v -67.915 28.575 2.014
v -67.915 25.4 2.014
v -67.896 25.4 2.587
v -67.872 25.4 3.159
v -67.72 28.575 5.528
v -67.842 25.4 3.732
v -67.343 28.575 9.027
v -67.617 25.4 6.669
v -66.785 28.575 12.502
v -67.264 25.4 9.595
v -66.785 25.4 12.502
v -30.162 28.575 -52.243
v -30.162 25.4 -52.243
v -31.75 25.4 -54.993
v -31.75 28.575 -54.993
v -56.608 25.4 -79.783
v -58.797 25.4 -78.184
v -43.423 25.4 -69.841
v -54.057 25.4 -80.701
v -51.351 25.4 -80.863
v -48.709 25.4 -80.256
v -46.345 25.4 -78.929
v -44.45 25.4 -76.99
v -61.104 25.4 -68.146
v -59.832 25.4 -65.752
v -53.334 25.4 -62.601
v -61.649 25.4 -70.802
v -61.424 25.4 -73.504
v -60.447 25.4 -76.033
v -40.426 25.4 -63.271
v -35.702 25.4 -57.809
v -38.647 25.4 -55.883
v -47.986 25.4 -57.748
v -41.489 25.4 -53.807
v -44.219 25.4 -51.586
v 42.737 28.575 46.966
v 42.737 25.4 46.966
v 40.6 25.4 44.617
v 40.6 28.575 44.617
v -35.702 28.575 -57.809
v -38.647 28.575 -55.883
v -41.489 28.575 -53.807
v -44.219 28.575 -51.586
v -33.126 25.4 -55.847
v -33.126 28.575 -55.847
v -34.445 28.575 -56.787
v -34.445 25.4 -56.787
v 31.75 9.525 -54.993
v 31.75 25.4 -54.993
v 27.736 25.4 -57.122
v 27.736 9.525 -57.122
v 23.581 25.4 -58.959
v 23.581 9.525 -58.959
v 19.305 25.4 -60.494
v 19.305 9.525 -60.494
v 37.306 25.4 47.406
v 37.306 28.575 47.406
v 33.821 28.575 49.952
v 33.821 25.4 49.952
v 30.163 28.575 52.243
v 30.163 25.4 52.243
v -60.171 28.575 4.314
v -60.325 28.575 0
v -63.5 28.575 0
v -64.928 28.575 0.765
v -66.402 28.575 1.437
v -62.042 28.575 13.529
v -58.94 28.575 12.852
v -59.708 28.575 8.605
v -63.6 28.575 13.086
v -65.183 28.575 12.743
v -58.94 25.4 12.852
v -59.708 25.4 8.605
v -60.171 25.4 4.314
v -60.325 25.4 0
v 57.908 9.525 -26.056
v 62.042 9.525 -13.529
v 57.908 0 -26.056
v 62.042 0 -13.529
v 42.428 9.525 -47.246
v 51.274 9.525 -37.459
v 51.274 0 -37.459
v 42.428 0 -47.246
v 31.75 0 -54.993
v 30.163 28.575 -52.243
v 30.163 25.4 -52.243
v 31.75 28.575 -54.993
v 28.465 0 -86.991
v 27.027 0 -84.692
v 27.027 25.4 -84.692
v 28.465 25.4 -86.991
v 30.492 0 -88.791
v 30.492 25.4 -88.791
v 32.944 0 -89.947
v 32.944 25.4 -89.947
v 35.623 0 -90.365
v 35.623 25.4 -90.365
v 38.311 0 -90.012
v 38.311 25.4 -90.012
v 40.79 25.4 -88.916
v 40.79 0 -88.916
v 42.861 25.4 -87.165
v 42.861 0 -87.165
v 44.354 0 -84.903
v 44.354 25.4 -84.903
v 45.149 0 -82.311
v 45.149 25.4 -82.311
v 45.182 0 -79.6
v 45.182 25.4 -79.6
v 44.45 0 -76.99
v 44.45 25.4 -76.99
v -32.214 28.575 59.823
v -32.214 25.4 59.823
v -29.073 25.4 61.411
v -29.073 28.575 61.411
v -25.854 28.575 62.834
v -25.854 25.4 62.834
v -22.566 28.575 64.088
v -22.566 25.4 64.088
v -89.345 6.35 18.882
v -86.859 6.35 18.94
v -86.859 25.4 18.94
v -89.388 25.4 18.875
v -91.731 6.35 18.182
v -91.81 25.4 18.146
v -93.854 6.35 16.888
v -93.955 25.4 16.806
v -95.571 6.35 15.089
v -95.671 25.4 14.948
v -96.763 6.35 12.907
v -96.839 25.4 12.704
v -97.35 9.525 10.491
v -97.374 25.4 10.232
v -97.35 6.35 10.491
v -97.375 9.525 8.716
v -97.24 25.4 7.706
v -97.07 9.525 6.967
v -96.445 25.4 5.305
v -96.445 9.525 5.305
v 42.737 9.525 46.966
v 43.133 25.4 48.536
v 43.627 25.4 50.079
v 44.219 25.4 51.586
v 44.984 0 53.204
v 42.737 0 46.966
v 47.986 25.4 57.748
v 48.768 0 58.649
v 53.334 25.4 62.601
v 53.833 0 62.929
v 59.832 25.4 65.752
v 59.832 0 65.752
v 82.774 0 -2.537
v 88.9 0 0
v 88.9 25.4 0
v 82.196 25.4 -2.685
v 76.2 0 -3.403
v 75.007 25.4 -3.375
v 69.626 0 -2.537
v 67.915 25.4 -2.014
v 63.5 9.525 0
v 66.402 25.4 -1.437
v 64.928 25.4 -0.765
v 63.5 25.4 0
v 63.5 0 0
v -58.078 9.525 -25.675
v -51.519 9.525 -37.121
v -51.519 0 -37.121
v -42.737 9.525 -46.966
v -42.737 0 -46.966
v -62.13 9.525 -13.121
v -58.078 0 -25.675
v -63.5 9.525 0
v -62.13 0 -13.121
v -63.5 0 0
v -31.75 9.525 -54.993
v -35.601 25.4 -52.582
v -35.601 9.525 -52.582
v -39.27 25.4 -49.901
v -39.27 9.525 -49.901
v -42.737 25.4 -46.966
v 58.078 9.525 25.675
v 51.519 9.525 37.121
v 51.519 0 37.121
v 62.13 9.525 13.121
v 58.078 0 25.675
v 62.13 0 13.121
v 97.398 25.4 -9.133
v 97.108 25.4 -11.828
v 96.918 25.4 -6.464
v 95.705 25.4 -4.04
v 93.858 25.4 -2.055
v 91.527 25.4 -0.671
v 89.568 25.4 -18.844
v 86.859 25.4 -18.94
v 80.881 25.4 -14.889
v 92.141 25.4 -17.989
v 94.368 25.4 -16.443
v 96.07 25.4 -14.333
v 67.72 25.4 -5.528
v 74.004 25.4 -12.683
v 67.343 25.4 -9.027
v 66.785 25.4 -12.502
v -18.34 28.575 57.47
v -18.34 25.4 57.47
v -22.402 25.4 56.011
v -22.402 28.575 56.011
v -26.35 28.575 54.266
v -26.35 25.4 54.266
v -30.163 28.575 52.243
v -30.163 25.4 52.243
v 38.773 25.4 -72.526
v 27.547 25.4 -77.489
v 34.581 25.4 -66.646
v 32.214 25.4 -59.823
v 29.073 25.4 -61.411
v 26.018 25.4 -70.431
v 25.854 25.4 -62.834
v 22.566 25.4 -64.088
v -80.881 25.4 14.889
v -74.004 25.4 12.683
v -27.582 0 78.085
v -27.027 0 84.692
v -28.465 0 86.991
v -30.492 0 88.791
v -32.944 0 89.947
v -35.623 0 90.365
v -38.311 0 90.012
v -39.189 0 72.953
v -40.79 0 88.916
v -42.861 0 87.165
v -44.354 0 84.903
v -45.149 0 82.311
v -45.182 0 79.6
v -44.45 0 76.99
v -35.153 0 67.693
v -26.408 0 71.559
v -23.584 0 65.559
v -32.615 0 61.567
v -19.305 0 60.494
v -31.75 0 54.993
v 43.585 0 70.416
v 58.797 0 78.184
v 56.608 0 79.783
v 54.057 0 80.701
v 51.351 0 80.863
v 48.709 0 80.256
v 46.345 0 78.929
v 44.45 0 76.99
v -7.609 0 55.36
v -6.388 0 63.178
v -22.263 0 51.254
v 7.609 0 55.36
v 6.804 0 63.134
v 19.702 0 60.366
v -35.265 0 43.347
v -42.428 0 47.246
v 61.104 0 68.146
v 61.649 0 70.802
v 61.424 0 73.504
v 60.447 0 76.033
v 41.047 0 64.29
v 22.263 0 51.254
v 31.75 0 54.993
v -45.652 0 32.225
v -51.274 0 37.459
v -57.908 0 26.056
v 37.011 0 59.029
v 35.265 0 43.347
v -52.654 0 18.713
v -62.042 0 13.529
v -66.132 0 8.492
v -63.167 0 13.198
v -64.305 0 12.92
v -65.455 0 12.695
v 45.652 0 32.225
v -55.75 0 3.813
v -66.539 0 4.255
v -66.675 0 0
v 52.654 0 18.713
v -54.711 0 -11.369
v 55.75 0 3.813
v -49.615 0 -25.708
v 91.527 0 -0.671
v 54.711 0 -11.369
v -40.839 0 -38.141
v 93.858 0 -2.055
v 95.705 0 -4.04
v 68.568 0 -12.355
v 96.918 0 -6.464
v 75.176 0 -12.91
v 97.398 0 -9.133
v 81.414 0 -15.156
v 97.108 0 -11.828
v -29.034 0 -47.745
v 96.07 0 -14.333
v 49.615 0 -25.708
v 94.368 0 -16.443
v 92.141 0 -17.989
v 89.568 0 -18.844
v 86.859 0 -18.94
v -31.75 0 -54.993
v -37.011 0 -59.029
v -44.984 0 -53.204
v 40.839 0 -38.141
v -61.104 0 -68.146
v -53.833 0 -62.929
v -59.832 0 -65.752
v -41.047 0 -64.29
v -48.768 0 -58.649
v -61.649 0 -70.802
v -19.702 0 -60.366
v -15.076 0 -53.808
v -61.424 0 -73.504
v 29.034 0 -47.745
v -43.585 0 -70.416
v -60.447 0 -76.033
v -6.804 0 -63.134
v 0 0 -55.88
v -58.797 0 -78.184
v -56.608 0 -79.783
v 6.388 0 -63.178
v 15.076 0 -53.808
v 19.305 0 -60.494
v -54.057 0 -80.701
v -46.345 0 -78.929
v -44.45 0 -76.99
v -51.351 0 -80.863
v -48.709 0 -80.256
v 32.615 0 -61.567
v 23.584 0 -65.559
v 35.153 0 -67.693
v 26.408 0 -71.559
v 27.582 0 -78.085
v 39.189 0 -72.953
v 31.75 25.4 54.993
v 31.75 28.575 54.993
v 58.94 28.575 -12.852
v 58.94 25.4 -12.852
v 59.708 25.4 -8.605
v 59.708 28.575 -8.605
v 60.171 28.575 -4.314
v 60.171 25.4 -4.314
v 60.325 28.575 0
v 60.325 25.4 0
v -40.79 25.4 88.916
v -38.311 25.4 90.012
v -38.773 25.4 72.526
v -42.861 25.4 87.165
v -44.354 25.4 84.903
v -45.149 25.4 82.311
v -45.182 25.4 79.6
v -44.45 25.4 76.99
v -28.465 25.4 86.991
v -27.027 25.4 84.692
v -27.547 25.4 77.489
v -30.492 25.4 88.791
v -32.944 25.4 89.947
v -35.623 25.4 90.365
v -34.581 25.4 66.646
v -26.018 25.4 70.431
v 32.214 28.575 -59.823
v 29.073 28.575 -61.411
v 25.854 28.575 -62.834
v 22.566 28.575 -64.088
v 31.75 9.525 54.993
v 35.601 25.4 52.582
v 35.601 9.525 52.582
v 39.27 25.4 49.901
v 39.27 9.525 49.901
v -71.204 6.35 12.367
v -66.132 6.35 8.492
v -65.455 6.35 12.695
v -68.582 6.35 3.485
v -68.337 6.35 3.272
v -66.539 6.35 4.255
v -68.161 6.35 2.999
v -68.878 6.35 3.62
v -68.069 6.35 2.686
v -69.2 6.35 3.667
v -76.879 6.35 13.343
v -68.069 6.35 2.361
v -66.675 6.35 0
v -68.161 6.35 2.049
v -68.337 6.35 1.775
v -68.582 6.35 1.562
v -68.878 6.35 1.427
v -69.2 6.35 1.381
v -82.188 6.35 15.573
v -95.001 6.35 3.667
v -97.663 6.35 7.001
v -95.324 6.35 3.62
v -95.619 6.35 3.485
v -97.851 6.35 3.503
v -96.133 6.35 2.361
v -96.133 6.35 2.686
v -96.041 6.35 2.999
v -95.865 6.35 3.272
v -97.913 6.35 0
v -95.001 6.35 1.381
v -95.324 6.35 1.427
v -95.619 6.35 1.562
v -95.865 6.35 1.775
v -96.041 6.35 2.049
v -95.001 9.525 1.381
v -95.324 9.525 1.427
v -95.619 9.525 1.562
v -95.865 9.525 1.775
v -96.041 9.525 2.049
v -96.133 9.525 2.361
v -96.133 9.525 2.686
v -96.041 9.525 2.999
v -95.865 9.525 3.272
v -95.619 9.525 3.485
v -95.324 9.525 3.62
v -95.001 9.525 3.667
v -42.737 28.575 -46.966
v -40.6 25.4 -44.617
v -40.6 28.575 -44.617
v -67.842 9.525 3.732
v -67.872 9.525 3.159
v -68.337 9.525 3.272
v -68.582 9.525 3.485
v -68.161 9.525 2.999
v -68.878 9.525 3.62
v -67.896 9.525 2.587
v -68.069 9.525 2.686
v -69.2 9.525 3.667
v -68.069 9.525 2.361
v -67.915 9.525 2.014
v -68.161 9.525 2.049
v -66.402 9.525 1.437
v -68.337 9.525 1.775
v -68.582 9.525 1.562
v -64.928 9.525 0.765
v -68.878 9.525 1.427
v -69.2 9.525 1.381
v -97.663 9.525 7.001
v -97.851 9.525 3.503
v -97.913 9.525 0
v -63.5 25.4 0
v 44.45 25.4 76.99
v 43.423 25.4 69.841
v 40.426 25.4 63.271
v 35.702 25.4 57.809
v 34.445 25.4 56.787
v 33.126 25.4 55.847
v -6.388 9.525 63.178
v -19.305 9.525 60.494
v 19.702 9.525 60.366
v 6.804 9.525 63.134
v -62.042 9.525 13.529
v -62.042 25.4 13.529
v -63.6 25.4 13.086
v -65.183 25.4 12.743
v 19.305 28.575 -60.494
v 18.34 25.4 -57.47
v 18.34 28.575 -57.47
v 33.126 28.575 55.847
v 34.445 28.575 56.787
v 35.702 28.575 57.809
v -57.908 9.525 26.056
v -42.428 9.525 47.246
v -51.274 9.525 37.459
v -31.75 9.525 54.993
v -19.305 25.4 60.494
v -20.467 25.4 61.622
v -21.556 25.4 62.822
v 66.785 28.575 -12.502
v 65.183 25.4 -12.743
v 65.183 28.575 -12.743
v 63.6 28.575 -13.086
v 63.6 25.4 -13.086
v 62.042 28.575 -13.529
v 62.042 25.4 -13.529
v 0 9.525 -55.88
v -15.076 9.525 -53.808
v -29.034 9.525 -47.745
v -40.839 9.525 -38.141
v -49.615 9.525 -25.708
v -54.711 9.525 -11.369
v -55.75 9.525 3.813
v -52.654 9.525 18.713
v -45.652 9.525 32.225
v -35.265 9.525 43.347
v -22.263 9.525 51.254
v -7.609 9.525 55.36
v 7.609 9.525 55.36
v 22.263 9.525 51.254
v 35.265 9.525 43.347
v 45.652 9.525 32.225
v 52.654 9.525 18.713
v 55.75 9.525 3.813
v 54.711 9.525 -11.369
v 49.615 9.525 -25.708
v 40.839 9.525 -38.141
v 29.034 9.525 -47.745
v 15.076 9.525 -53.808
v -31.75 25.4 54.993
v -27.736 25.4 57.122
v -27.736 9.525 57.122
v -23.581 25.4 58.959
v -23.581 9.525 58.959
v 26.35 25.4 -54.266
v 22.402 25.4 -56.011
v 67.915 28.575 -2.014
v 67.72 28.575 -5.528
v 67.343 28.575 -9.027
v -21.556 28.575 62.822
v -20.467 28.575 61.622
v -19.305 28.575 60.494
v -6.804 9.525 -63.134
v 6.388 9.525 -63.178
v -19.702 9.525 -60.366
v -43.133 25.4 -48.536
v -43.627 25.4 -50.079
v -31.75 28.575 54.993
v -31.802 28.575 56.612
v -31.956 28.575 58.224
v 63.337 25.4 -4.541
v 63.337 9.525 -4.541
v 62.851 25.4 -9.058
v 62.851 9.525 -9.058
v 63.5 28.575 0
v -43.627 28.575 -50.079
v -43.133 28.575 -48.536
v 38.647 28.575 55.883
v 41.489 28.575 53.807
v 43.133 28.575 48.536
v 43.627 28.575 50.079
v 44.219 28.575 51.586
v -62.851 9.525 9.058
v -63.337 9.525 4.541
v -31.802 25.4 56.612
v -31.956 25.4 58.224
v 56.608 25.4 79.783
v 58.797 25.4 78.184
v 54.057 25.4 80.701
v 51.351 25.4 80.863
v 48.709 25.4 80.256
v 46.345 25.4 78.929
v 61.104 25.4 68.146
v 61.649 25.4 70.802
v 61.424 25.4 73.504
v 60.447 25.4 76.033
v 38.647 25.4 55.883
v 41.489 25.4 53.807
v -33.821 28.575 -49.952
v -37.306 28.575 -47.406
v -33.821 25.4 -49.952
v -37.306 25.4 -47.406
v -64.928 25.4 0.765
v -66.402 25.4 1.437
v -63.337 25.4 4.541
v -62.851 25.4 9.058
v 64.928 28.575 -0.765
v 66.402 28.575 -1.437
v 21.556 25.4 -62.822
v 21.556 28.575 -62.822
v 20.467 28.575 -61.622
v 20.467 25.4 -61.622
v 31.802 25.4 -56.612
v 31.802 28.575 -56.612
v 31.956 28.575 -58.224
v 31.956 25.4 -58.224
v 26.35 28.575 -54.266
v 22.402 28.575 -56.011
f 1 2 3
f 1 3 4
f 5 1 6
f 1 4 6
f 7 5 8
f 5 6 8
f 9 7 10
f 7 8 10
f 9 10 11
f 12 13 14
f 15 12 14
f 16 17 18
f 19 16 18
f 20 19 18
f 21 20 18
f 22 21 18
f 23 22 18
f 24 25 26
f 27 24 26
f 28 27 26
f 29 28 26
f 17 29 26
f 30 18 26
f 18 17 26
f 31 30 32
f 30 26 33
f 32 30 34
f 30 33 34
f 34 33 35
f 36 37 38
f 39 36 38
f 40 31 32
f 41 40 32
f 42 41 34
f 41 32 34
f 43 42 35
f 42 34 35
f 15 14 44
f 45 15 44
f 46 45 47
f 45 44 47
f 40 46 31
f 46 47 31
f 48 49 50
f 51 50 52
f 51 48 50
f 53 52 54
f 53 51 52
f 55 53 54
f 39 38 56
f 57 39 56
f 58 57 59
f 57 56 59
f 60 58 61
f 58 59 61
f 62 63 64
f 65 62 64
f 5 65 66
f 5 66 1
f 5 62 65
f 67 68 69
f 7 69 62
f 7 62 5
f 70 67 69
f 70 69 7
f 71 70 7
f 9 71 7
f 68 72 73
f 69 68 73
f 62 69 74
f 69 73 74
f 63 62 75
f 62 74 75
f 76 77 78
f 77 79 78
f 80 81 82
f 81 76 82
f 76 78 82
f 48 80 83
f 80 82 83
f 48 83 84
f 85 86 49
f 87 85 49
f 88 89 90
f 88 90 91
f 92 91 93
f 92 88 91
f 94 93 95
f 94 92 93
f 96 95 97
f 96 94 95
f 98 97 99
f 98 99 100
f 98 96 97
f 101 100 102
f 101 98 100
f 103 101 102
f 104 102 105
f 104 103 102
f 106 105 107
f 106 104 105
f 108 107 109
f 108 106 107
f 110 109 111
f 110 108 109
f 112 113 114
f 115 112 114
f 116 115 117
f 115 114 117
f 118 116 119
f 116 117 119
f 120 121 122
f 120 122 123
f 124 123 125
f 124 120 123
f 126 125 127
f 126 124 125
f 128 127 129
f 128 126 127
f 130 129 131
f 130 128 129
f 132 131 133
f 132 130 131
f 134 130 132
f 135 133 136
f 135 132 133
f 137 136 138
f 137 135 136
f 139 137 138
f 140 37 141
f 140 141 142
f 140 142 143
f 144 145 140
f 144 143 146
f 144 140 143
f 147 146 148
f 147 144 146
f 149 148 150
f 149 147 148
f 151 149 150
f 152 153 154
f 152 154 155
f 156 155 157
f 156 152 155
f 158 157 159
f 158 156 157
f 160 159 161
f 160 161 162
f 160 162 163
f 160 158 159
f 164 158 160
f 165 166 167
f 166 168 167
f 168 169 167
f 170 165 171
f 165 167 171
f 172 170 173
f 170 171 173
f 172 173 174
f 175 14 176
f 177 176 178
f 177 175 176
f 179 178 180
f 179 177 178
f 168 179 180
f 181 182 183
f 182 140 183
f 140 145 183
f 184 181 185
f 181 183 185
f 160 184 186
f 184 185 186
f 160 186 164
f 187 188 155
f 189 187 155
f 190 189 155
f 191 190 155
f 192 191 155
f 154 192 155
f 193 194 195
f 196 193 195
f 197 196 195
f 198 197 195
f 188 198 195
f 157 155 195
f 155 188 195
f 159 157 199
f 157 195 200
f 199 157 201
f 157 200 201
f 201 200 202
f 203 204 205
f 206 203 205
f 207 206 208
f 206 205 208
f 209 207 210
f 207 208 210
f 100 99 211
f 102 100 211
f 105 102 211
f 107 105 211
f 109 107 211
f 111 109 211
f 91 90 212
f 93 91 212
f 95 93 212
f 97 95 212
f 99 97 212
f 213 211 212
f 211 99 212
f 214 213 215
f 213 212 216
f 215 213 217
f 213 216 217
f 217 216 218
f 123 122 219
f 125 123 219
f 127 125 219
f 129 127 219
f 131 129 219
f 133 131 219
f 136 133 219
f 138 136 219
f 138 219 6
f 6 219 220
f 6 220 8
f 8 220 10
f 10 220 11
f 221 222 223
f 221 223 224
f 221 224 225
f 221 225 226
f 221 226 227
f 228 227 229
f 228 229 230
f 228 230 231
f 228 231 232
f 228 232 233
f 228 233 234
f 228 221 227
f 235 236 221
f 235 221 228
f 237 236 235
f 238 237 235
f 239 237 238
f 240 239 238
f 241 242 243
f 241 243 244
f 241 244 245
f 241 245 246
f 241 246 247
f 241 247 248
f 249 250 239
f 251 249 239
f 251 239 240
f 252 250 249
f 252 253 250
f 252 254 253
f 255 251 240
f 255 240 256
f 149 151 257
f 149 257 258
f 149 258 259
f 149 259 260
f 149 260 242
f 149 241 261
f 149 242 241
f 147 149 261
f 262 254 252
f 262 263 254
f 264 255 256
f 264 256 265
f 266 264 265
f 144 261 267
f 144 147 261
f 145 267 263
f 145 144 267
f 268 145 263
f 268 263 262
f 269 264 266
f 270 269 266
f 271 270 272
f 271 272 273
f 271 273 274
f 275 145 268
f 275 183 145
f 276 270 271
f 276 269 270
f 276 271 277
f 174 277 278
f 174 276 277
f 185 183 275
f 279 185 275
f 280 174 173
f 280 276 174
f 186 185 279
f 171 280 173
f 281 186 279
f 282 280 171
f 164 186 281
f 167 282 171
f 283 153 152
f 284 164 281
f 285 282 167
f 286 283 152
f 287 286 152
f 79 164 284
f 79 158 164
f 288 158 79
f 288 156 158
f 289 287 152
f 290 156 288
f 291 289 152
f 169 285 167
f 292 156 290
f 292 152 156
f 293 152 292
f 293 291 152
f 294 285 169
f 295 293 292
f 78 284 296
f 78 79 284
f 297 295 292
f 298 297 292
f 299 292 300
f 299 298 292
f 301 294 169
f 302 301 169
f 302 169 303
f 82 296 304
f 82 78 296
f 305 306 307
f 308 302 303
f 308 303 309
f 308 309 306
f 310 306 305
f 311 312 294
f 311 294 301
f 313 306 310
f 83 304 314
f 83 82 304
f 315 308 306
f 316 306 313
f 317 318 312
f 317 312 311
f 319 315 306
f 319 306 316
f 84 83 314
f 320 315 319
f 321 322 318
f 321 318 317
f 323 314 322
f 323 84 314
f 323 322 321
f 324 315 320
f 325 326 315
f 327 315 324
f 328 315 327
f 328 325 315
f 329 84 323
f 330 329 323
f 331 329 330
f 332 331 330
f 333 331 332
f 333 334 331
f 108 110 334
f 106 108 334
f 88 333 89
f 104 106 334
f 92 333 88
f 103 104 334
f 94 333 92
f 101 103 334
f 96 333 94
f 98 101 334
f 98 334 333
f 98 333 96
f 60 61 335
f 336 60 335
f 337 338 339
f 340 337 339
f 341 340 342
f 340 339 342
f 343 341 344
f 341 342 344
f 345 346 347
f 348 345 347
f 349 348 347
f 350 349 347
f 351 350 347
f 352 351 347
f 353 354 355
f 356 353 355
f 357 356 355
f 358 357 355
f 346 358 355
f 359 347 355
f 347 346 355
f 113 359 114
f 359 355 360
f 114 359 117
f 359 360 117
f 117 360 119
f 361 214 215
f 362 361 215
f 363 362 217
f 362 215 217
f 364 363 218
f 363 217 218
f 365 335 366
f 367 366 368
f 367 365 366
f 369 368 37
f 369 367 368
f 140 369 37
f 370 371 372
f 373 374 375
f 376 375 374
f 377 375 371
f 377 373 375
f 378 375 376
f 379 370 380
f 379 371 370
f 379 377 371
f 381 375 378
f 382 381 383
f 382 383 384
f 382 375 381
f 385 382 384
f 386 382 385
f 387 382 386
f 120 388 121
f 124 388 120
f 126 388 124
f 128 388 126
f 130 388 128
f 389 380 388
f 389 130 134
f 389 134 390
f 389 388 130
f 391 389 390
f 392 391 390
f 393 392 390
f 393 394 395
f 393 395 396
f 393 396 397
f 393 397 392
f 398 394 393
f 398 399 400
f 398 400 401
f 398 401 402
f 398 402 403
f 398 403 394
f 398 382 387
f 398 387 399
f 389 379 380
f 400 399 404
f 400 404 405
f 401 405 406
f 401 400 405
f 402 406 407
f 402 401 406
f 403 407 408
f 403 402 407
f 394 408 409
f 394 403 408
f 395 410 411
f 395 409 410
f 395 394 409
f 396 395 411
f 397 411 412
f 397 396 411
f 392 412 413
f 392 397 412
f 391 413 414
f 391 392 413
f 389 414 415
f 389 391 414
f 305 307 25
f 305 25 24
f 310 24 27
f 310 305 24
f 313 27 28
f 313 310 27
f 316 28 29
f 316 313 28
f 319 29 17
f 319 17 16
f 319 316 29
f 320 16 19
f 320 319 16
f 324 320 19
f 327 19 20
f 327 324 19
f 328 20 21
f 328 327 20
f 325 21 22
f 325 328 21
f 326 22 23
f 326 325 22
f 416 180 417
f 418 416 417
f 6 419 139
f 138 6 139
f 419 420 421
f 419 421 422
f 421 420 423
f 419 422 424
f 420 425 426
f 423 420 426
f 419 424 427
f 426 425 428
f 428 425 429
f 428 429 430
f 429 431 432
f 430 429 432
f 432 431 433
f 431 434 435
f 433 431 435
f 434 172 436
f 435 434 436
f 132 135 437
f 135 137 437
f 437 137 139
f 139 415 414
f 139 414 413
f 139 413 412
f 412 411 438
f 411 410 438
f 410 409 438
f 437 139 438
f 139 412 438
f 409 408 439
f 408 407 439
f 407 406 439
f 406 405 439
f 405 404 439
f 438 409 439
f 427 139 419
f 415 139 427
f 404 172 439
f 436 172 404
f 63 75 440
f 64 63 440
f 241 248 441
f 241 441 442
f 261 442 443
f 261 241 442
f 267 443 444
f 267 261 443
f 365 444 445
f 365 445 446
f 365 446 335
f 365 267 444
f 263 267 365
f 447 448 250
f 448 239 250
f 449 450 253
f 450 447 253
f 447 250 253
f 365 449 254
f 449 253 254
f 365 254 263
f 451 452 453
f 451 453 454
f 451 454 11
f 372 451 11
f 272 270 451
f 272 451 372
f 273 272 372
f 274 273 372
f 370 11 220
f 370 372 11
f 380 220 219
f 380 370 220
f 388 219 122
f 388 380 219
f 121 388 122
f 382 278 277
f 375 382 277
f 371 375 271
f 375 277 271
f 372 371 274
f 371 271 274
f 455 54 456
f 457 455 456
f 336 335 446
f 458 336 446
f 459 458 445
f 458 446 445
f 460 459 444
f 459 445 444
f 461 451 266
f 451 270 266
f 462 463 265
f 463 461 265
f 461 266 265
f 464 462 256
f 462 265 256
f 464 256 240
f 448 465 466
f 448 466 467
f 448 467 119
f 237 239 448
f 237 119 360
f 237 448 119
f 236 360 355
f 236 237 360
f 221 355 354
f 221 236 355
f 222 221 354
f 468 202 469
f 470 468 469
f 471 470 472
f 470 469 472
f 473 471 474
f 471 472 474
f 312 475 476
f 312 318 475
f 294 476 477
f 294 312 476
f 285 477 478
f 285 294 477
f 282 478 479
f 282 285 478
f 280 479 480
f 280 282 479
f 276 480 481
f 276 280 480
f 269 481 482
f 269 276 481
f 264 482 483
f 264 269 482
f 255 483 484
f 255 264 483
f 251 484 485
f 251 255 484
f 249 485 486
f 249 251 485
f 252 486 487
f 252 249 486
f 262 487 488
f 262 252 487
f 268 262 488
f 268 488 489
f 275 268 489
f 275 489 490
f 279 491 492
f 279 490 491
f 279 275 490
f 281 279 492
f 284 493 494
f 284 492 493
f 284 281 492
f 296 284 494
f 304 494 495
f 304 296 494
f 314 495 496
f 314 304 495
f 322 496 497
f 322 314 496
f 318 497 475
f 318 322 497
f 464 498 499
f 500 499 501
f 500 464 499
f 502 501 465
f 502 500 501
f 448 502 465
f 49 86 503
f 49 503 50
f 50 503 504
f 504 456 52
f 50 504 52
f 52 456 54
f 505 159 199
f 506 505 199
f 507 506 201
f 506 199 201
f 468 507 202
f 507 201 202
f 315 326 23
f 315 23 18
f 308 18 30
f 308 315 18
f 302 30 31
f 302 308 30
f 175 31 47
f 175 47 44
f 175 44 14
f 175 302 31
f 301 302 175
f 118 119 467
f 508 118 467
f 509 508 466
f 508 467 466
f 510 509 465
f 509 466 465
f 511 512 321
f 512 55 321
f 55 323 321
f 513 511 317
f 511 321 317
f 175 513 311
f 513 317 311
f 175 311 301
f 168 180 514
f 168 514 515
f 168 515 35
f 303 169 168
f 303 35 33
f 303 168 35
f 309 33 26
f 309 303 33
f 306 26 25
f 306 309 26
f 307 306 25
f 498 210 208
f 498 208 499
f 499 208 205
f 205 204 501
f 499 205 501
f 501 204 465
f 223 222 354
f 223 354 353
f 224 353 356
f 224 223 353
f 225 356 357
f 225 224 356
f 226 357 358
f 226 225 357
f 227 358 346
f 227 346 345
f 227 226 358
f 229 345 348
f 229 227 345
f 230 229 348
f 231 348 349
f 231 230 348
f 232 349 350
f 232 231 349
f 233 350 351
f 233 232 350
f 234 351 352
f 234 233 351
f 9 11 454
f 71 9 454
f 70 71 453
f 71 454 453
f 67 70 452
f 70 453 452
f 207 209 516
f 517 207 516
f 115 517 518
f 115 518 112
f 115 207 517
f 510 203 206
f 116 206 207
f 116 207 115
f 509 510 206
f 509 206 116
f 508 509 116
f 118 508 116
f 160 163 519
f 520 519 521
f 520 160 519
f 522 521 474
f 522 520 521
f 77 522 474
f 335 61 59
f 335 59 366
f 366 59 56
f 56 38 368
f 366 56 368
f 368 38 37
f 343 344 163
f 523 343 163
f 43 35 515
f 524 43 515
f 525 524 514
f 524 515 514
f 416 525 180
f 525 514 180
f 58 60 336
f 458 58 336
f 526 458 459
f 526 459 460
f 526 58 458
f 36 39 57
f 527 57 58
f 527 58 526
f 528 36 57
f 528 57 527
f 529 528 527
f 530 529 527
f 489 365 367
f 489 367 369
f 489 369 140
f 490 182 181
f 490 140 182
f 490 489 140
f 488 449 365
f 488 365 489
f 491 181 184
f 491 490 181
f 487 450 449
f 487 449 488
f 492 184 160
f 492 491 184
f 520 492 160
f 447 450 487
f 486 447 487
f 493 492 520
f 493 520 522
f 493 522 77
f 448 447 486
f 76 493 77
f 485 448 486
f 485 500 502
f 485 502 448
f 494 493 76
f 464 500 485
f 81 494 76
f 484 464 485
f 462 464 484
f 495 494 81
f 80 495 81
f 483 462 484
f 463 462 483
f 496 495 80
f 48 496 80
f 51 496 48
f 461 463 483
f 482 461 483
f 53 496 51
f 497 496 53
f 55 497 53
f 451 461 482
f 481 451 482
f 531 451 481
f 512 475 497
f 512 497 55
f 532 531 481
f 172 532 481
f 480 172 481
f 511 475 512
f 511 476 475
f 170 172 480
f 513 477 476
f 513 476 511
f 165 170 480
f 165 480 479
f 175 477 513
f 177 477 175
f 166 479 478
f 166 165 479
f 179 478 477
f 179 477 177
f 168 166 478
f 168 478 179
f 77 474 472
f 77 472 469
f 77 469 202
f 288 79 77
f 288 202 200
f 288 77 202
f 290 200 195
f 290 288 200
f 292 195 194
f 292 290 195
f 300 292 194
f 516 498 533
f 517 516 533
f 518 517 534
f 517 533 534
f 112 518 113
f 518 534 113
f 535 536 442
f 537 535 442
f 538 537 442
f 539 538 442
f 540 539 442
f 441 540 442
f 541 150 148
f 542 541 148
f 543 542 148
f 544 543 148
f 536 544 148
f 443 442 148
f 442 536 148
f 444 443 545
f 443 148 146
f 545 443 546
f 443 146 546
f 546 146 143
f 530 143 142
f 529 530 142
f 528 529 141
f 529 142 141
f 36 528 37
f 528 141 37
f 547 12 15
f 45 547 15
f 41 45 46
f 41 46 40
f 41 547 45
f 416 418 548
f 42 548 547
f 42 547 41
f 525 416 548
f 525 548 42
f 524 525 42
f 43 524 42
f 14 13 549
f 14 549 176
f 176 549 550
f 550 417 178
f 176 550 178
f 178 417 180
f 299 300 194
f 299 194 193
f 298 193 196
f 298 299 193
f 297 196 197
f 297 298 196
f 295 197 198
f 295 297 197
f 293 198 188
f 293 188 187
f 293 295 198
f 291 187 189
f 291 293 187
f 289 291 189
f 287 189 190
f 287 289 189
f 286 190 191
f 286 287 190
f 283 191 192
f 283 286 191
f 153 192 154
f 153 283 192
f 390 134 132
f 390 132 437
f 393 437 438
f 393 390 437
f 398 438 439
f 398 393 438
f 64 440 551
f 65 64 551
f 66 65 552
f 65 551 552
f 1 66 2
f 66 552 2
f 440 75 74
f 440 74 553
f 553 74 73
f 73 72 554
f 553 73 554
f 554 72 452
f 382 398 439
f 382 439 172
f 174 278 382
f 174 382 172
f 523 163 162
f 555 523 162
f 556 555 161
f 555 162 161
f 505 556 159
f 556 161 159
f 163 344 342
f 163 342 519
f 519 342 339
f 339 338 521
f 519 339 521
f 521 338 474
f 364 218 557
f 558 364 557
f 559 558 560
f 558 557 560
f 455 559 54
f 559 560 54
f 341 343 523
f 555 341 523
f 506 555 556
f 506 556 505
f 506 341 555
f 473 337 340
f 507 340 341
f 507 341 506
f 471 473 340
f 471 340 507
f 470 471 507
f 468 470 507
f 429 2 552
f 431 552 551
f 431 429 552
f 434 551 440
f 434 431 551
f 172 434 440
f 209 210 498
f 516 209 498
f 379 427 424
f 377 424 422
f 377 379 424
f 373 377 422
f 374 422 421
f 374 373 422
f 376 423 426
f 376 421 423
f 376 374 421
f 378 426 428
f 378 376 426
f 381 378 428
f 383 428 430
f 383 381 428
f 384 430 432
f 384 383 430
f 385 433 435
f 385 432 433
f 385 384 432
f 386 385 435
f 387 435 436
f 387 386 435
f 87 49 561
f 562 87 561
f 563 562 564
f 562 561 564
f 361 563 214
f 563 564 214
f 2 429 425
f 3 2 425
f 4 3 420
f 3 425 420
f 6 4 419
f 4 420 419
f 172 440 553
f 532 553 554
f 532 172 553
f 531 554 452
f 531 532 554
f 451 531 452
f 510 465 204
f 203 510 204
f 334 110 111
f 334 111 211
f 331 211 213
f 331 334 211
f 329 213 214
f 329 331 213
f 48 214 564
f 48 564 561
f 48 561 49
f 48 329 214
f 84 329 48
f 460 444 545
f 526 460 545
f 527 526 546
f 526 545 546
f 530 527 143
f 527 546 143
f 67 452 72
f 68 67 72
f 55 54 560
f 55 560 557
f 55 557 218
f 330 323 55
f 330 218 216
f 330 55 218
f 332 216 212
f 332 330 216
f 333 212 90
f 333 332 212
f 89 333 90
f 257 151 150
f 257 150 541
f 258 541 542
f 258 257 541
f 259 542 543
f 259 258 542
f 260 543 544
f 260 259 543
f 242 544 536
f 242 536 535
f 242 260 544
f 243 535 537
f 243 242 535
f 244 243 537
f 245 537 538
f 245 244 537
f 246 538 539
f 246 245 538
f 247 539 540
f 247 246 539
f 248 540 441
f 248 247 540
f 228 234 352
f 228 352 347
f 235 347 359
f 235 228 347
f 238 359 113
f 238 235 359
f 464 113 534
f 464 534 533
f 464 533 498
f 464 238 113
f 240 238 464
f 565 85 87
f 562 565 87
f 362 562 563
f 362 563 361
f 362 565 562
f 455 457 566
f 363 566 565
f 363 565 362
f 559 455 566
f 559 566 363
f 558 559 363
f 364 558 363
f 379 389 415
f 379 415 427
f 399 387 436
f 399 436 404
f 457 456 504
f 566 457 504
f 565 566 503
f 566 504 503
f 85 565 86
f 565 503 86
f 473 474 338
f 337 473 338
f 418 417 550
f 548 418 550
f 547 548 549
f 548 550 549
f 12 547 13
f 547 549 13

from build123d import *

# Parameters (mm, degrees)
SKETCH1_R                = 63.5
SKETCH1_R_2              = 55.88
BOSS_EXTRUDE1_DEPTH      = 9.525
BOSS_EXTRUDE2_DEPTH      = 15.875
BOSS_EXTRUDE2_DEPTH_BACK = 9.525
BOSS_EXTRUDE3_DEPTH      = 3.175
CIRPATTERN1_COUNT        = 6
BOSS_EXTRUDE7_DEPTH      = 9.525
CUT_EXTRUDE5_DEPTH       = 6.35
CUT_EXTRUDE8_START       = -15.875
CUT_EXTRUDE8_DEPTH       = 15.875
CUT_EXTRUDE10_DEPTH      = 10.414


with BuildPart() as part:
    # Sketch1 → Boss-Extrude1 (new body)
    with BuildSketch(Plane(origin=(0, 0, 0), x_dir=(1, 0, 0), z_dir=(0, 1, 0))):
        with Locations(Location((0, 0, 0), (0, 0, 90))):
            Circle(SKETCH1_R)
        with Locations(Location((0, 0, 0), (0, 0, 90))):
            Circle(SKETCH1_R_2, mode=Mode.SUBTRACT)
    extrude(amount=BOSS_EXTRUDE1_DEPTH)

    # Sketch2 → Boss-Extrude2 (add, two sides: drawn at the far end of the back side and taken through both)
    with BuildSketch(Plane(origin=(0, 9.525, 0), x_dir=(1, 0, 0), z_dir=(0, 1, 0)).offset(-BOSS_EXTRUDE2_DEPTH_BACK)):
        with BuildLine():
            ThreePointArc((62.042091837, 13.528815193), (75.175517225, 12.909752551), (86.858928571, 18.94034127))
            ThreePointArc((86.858928571, 18.94034127), (97.349634921, 10.490706349), (88.9, 0))
            ThreePointArc((88.9, 0), (76.2, 3.402954744), (63.5, 0))
            ThreePointArc((63.5, 0), (63.1344709, 6.803571429), (62.042091837, 13.528815193))
        make_face()
    extrude(amount=BOSS_EXTRUDE2_DEPTH + BOSS_EXTRUDE2_DEPTH_BACK)

    # Sketch3 → Boss-Extrude3 (add)
    with BuildSketch(Plane(origin=(0, 25.4, 0), x_dir=(1, 0, 0), z_dir=(0, 1, 0))):
        with BuildLine():
            Line((60.325, 0), (63.5, 0))
            ThreePointArc((63.5, 0), (65.659371798, 1.11258817), (67.915149907, 2.013811849))
            ThreePointArc((67.915149907, 2.013811849), (67.553883863, 7.279821429), (66.784920566, 12.501896255))
            ThreePointArc((66.784920566, 12.501896255), (64.388925587, 12.901830068), (62.042091837, 13.528815193))
            Line((62.042091837, 13.528815193), (58.939987245, 12.852374433))
            ThreePointArc((58.939987245, 12.852374433), (59.977747355, 6.463392857), (60.325, 0))
        make_face()
    extrude(amount=BOSS_EXTRUDE3_DEPTH)


with BuildPart() as cirpattern1_1:
    # CirPattern1: pattern copy
    add(part.part.rotate(Axis((0, 0, 0), (0, 1, 0)), 1 * 360 / CIRPATTERN1_COUNT))


with BuildPart() as cirpattern1_2:
    # CirPattern1: pattern copy
    add(part.part.rotate(Axis((0, 0, 0), (0, 1, 0)), 2 * 360 / CIRPATTERN1_COUNT))


with BuildPart() as cirpattern1_3:
    # CirPattern1: pattern copy
    add(part.part.rotate(Axis((0, 0, 0), (0, 1, 0)), 3 * 360 / CIRPATTERN1_COUNT))


with BuildPart() as cirpattern1_4:
    # CirPattern1: pattern copy
    add(part.part.rotate(Axis((0, 0, 0), (0, 1, 0)), 4 * 360 / CIRPATTERN1_COUNT))


with BuildPart() as cirpattern1_5:
    # CirPattern1: pattern copy
    add(part.part.rotate(Axis((0, 0, 0), (0, 1, 0)), 5 * 360 / CIRPATTERN1_COUNT))


with BuildPart() as part_1:
    add(part.part)

    add(cirpattern1_1.part)  # Boss-Extrude7 merges CirPattern1_1

    add(cirpattern1_2.part)  # Boss-Extrude7 merges CirPattern1_2

    add(cirpattern1_3.part)  # Boss-Extrude7 merges CirPattern1_3

    add(cirpattern1_4.part)  # Boss-Extrude7 merges CirPattern1_4

    add(cirpattern1_5.part)  # Boss-Extrude7 merges CirPattern1_5
    # Sketch7 → Boss-Extrude7 (add)
    with BuildSketch(Plane(origin=(0, 0, 0), x_dir=(-1, 0, 0), z_dir=(0, -1, 0))):
        with BuildLine():
            Line((63.5, 0), (67.569096786, -7.577162194))
            Line((67.569096786, -7.577162194), (97.349634921, -10.490706349))
            ThreePointArc((97.349634921, -10.490706349), (97.772251641, -5.252918049), (97.91325926, 0))
            Line((97.91325926, 0), (88.9, 0))
            Line((88.9, 0), (63.5, 0))
        make_face()
    extrude(amount=-BOSS_EXTRUDE7_DEPTH)

    # Sketch9 → Cut-Extrude5 (cut)
    with BuildSketch(Plane(origin=(0, 0, 0), x_dir=(-1, 0, 0), z_dir=(0, -1, 0))):
        with BuildLine():
            Line((61.39651055, -26.00046379), (106.955649778, -39.531378336))
            Line((106.955649778, -39.531378336), (132.962005417, 11.016778764))
            Line((132.962005417, 11.016778764), (94.714323946, 43.842731985))
            Line((94.714323946, 43.842731985), (63.332617029, 20.845508994))
            ThreePointArc((63.332617029, 20.845508994), (66.618128975, -2.753273836), (61.39651055, -26.00046379))
        make_face()
    extrude(amount=-CUT_EXTRUDE5_DEPTH, mode=Mode.SUBTRACT)

    # Sketch11 → Cut-Extrude8 (cut)
    with BuildSketch(Plane(origin=(0, 25.4, 0), x_dir=(1, 0, 0), z_dir=(0, 1, 0)).offset(CUT_EXTRUDE8_START)):
        with BuildLine():
            Line((-67.842452842, -3.731570369), (-122.840055189, -6.75662938))
            Line((-122.840055189, -6.75662938), (-98.142005423, 22.287709704))
            Line((-98.142005423, 22.287709704), (-66.460403185, 14.125786119))
            ThreePointArc((-66.460403185, 14.125786119), (-67.742420826, 5.242847087), (-67.842452842, -3.731570369))
        make_face()
    extrude(amount=CUT_EXTRUDE8_DEPTH, mode=Mode.SUBTRACT)

    # Sketch12 → Cut-Extrude10 (cut)
    with BuildSketch(Plane.XZ.offset(-6.35)):
        with BuildLine():
            Line((-69.200337384, 1.380715925), (-95.001475013, 1.380715925))
            ThreePointArc((-95.001475013, 1.380715925), (-96.144492419, 2.523733331), (-95.001475013, 3.666750736))
            Line((-95.001475013, 3.666750736), (-69.200337384, 3.666750736))
            ThreePointArc((-69.200337384, 3.666750736), (-68.057319979, 2.523733331), (-69.200337384, 1.380715925))
        make_face()
    extrude(amount=-CUT_EXTRUDE10_DEPTH, mode=Mode.SUBTRACT)


solid = part_1.part
